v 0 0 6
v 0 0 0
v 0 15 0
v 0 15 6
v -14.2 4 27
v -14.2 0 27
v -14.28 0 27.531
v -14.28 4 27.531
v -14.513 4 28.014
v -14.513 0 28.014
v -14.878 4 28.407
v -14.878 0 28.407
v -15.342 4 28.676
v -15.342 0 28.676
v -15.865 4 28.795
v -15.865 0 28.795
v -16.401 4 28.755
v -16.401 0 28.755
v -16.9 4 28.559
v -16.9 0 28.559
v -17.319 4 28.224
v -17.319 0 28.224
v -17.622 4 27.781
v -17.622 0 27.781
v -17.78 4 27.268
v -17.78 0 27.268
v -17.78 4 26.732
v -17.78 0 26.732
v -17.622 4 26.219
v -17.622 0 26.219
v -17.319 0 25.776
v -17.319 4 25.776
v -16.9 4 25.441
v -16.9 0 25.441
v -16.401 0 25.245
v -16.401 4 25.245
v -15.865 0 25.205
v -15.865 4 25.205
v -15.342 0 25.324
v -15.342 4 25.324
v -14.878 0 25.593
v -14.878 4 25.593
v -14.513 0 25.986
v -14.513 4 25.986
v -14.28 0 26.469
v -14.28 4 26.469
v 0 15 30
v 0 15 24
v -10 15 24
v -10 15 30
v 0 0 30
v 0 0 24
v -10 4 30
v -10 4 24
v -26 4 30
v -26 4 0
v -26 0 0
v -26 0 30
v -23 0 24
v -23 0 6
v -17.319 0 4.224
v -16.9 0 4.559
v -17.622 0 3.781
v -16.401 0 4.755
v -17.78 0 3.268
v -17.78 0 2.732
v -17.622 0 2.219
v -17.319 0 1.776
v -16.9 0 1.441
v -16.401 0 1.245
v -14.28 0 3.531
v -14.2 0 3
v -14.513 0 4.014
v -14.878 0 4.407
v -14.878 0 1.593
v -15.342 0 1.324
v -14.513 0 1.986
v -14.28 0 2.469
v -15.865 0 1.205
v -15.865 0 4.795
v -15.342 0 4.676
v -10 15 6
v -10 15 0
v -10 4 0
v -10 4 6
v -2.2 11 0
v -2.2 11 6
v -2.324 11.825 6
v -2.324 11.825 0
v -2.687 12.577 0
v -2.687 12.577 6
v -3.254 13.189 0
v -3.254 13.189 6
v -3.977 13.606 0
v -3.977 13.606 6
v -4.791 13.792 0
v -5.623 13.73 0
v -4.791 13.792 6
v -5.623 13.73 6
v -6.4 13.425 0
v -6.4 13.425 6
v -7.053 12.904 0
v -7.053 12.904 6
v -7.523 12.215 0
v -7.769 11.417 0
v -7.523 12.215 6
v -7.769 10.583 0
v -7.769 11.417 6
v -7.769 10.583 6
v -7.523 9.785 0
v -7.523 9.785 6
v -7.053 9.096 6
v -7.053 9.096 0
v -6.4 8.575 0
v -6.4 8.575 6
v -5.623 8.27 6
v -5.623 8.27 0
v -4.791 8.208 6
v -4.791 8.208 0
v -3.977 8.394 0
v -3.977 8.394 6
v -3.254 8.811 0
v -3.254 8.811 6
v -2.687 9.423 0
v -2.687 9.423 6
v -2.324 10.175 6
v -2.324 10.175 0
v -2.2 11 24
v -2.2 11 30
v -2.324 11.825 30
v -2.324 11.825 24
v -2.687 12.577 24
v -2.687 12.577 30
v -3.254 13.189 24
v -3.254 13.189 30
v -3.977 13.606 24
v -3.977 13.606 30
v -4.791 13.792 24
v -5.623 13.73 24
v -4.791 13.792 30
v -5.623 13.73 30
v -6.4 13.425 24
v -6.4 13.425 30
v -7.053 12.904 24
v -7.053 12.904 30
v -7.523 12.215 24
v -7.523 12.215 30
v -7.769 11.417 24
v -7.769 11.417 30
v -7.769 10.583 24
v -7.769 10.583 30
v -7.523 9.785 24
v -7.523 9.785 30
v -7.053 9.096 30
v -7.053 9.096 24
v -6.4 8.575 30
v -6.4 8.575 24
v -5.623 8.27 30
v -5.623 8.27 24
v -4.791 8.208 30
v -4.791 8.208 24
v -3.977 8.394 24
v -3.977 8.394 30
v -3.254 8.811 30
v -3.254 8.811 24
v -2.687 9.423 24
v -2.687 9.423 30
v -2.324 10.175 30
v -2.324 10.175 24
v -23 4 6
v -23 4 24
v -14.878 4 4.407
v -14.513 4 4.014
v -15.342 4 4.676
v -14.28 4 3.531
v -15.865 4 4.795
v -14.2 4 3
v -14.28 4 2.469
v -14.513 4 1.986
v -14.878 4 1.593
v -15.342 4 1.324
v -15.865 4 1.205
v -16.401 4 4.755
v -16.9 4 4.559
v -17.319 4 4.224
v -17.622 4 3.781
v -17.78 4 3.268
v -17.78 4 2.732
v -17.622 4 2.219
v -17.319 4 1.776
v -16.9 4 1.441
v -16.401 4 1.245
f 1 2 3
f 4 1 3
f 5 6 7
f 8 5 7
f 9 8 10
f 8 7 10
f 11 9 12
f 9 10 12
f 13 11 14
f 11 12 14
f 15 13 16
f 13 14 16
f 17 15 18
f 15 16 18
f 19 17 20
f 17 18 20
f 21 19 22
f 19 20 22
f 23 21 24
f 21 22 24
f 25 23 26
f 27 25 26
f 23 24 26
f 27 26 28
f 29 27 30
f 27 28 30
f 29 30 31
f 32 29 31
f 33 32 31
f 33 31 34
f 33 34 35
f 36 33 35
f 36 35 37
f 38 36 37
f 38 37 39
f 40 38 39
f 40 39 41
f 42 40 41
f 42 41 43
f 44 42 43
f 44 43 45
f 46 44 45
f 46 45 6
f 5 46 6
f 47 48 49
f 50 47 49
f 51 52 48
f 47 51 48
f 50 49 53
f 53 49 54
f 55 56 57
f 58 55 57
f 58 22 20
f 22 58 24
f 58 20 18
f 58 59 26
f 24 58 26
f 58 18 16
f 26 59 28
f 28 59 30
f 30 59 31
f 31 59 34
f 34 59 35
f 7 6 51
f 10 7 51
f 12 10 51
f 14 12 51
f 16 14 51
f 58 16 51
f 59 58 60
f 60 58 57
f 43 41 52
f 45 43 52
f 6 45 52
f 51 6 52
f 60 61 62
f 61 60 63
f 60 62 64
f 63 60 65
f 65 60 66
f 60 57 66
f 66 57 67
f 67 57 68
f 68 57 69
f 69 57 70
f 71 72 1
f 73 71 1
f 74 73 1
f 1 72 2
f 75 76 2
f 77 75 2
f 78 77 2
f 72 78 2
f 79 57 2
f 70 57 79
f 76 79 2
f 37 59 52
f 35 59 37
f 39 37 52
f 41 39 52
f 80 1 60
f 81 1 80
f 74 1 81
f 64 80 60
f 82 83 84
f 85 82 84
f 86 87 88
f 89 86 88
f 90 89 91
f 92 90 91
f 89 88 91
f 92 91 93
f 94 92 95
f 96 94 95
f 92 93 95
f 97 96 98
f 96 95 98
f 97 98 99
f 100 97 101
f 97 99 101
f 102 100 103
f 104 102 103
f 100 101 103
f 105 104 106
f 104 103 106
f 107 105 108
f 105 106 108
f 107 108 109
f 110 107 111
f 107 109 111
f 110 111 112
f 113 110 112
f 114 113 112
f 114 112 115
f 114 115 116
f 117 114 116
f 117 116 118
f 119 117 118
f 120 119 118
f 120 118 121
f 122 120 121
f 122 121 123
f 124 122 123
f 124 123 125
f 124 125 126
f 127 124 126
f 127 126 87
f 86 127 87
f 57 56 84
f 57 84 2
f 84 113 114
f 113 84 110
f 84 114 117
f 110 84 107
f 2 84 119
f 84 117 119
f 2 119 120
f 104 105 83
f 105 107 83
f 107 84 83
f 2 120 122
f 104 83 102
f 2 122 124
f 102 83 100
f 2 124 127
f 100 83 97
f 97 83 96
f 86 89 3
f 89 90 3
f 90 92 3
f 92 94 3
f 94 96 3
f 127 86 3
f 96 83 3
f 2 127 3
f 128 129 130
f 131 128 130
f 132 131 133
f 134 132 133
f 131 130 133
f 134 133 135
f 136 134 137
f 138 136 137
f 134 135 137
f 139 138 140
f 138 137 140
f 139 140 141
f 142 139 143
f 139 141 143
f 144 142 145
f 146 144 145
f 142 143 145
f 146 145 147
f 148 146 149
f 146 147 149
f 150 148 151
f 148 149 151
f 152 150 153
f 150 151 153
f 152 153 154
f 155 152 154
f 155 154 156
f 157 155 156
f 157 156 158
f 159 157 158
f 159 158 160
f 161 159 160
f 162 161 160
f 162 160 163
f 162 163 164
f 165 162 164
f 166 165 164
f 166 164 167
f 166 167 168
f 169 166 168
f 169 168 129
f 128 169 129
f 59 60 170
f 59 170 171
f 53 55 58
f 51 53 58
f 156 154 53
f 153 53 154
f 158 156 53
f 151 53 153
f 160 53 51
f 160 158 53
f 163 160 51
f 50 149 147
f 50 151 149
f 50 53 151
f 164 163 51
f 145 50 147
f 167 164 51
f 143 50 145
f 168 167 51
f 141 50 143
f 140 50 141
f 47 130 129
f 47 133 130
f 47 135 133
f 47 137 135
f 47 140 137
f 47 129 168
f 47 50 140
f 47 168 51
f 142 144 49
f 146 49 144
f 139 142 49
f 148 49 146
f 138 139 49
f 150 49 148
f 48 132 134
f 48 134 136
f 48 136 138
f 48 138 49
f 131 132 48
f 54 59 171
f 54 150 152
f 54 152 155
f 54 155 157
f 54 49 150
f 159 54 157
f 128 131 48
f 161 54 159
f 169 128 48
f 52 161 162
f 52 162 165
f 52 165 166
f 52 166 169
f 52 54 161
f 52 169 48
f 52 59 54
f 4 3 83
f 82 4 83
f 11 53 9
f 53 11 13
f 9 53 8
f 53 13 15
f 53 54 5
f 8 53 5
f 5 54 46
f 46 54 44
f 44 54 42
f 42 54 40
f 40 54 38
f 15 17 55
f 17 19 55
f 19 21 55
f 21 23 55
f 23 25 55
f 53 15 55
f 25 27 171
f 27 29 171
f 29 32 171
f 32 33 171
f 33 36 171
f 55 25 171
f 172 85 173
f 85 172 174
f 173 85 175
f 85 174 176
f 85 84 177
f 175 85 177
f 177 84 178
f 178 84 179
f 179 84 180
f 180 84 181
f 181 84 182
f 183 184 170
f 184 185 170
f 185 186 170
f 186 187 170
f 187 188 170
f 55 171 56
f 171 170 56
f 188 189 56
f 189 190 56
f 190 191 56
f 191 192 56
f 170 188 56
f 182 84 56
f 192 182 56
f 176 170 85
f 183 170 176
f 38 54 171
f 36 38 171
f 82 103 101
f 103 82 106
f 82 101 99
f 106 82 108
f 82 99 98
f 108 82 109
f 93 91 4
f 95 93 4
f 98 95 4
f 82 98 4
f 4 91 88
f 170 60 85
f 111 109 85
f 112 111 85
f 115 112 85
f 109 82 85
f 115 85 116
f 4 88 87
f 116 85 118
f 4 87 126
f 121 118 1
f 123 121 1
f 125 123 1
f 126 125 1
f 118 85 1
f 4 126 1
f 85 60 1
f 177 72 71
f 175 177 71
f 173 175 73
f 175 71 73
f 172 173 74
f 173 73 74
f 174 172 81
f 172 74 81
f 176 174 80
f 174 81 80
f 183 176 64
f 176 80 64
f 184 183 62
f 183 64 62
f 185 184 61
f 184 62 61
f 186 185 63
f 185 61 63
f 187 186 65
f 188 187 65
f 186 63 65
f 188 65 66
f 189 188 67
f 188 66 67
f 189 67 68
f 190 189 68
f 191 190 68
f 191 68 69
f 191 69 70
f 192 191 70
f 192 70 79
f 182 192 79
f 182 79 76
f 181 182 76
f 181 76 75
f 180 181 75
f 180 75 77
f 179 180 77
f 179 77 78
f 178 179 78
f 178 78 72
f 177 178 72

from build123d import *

# Parameters (mm, degrees)
PAD_DEPTH       = 30
SKETCH001_R     = 1.8
SKETCH001_W     = 29.168577
SKETCH001_H     = 18
POCKET_DEPTH    = 15.001
SKETCH002_R     = 2.8
POCKET001_DEPTH = 30.001


with BuildPart() as part:
    # Sketch → Pad (new body)
    with BuildSketch(Plane.XY):
        Polygon((-10, 4), (-26, 4), (-26, 0), (0, 0), (0, 15), (-10, 15), align=None)
    extrude(amount=PAD_DEPTH)

    # Sketch001 → Pocket (cut, through all)
    with BuildSketch(Plane.XZ):
        with Locations((-16, 27)):
            Circle(SKETCH001_R)
        with Locations((-16, 3)):
            Circle(SKETCH001_R)
        with Locations((-8.415712, 15)):
            Rectangle(SKETCH001_W, SKETCH001_H)
    extrude(amount=-POCKET_DEPTH, mode=Mode.SUBTRACT)

    # Sketch002 → Pocket001 (cut, through all)
    with BuildSketch(Plane.XY.offset(30)):
        with Locations((-5, 11)):
            Circle(SKETCH002_R)
    extrude(amount=-POCKET001_DEPTH, mode=Mode.SUBTRACT)


solid = part.part
